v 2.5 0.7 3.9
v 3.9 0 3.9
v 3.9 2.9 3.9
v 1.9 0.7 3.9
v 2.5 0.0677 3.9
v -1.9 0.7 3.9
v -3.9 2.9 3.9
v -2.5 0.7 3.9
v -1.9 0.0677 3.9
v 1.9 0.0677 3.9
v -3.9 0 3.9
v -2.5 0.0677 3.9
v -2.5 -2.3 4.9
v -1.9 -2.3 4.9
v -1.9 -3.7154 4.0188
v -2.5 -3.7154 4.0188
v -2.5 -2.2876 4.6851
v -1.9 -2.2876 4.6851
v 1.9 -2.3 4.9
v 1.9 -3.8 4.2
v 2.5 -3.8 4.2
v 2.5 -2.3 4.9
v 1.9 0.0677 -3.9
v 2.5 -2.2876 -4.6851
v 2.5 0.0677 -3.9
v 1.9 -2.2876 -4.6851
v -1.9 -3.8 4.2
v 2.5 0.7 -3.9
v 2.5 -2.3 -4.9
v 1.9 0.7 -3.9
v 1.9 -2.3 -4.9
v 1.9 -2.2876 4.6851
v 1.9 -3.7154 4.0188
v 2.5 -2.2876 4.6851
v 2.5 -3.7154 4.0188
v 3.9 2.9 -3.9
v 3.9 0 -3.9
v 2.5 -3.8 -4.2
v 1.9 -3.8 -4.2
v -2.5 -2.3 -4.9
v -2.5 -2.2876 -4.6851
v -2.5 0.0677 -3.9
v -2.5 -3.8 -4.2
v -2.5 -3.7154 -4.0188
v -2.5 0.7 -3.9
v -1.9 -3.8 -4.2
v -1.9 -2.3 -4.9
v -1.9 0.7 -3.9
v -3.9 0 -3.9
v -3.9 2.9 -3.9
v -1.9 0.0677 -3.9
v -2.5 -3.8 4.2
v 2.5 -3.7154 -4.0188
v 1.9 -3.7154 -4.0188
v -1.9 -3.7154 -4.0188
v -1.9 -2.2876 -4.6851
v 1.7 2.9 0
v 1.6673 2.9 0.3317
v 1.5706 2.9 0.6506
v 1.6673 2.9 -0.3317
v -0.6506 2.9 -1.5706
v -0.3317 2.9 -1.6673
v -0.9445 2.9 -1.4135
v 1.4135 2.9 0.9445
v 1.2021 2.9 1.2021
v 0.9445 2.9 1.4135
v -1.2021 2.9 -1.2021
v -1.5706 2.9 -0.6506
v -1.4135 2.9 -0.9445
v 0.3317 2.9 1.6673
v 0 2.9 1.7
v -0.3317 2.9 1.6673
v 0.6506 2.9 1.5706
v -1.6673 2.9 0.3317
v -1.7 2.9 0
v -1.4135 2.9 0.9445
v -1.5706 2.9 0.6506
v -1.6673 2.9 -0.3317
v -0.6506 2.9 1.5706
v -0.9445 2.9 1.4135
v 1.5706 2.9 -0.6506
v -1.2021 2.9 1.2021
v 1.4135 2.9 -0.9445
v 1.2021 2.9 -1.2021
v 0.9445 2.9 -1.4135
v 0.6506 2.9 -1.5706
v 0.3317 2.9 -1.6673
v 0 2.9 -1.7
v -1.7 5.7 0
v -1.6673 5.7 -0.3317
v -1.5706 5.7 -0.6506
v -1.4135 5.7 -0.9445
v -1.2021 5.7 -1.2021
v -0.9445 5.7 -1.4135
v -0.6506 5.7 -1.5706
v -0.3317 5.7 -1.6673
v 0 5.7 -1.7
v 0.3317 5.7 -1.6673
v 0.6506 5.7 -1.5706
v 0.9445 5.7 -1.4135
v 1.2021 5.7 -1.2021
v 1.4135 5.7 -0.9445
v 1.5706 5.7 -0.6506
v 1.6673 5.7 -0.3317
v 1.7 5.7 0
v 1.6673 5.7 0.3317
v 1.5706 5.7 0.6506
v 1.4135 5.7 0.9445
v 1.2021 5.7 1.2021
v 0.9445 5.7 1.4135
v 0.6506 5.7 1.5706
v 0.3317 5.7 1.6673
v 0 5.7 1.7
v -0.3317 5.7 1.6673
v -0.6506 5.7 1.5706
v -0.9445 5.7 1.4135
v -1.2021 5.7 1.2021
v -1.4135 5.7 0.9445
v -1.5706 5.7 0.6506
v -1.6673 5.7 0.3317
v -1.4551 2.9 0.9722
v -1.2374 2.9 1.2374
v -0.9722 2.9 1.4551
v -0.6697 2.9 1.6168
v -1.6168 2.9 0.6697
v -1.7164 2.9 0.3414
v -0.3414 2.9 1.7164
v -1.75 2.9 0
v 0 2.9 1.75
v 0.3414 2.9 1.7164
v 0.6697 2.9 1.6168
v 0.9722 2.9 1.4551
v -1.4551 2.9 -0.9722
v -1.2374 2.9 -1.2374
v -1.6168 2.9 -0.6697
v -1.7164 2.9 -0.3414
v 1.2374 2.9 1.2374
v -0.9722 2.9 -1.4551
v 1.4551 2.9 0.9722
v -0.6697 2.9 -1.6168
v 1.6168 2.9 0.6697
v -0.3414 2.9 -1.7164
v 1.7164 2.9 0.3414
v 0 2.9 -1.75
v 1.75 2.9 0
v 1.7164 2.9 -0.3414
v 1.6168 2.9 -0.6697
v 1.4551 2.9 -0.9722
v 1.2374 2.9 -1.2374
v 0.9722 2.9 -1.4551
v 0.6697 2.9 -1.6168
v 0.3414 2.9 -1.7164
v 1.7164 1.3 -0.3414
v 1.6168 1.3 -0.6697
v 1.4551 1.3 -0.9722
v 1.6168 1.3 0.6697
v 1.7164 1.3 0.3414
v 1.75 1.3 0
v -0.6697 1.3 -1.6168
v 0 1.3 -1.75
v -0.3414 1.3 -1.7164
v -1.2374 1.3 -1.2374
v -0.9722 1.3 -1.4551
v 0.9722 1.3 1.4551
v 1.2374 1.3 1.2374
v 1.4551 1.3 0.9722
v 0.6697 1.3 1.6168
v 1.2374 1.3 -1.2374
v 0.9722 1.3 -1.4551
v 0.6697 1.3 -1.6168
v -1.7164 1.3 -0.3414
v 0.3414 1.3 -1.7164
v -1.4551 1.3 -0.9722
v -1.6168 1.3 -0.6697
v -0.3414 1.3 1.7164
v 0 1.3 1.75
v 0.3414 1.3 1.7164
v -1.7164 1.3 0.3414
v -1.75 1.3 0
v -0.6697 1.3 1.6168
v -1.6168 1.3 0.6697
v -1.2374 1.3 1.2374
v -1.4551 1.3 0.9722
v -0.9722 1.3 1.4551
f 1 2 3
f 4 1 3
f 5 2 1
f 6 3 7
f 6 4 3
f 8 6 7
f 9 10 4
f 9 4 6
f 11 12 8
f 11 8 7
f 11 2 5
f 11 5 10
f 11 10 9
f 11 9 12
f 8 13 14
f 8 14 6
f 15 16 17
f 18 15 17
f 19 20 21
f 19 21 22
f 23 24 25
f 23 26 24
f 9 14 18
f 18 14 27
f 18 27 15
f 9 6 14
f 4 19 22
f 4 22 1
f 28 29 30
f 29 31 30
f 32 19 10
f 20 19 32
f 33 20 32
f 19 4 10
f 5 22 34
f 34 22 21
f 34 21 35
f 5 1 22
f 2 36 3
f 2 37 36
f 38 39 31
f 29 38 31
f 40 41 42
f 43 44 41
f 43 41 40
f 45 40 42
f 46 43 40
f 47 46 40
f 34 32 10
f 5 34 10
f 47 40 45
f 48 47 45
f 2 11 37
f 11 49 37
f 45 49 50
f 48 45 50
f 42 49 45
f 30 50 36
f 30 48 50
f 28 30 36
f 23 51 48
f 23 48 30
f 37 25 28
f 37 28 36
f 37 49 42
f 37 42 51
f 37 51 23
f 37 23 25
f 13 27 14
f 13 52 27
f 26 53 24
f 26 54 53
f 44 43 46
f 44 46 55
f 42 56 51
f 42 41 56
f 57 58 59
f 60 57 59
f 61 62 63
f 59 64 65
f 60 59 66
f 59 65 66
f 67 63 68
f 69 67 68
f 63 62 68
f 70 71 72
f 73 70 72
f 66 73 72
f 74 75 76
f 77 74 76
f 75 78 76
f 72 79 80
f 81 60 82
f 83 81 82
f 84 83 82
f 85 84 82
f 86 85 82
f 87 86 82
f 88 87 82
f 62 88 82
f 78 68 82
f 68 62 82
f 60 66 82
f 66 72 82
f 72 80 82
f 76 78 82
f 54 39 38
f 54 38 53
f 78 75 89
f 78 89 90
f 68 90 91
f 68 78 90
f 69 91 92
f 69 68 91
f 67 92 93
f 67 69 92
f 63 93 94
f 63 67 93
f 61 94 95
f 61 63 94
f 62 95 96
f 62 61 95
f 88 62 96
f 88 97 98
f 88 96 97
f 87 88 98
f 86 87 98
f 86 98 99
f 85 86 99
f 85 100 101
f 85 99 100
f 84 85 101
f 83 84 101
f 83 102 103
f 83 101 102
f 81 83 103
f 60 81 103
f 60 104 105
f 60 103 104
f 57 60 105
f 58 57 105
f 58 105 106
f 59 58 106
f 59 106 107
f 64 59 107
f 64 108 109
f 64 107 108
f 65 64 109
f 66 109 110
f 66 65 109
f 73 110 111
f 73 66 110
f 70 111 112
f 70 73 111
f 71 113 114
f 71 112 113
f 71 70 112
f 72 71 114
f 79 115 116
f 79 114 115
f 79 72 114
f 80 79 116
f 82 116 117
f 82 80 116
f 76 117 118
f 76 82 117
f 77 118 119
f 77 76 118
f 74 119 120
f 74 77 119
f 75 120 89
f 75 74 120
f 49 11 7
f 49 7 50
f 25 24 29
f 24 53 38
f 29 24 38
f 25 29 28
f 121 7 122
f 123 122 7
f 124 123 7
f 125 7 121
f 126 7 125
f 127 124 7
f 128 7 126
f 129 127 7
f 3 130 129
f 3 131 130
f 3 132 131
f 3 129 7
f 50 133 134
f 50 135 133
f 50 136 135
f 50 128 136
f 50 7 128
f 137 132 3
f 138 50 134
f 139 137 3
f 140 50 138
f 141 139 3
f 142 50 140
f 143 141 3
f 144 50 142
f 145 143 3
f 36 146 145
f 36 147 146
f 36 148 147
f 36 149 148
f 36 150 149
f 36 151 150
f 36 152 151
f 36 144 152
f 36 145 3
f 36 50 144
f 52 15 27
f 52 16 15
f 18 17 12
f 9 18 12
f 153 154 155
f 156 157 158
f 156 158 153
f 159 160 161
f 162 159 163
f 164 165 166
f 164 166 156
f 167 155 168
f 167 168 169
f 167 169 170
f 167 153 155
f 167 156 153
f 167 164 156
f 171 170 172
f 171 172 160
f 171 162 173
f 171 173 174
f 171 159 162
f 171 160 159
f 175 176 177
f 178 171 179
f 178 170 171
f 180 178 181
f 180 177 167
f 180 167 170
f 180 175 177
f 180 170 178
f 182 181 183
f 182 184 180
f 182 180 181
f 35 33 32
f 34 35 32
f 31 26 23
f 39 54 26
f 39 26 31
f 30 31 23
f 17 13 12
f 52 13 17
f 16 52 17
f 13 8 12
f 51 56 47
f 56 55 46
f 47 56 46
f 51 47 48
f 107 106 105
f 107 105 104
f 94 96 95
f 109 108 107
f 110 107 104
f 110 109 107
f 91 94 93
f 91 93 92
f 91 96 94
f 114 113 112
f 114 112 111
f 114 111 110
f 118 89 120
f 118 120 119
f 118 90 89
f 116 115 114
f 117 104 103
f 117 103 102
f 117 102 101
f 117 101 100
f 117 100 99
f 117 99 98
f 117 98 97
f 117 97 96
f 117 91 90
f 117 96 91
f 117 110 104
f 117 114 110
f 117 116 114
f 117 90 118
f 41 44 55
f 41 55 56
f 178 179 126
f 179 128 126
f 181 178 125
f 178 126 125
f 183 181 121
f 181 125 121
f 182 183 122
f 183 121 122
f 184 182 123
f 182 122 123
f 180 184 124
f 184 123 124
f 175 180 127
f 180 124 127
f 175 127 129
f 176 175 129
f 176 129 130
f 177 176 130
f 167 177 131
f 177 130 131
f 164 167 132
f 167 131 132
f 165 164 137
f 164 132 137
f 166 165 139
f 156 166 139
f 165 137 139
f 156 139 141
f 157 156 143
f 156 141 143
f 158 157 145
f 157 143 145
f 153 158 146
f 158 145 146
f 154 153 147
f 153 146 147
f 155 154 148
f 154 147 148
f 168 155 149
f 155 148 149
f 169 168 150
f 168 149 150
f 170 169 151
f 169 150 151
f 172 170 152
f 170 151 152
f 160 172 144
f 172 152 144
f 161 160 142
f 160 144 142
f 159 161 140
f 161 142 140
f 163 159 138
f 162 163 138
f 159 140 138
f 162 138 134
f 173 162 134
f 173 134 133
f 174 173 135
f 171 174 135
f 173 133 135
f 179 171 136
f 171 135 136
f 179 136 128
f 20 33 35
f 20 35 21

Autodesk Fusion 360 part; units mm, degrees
sketch "Sketch1" plane through (0, 0, 0) normal (0, 1, 0) x (1, 0, 0) in component "Base"
  line L0 (3.9, -3.9) -> (-3.9, -3.9)
  line L1 (-3.9, -3.9) -> (-3.9, 3.9)
  line L2 (-3.9, 3.9) -> (3.9, 3.9)
  line L3 (3.9, 3.9) -> (3.9, -3.9)
  line L4 (3.9, -3.9) -> (-3.9, 3.9) construction
  line L5 (-3.9, -3.9) -> (3.9, 3.9) construction
  dimension "d1" = 7.8
  dimension "d2" = 7.8
extrude "Extrude1" add sketch "Sketch1" along normal blind 2.9 makes body 1 in component "Base"
ref_plane "WorkPlane1" through (-3.9, 1.45, 0) normal (-1, 0, 0) x (0, 0, 1) in component "Base"
sketch "Sketch2" plane through (-3.9, 1.45, 0) normal (-1, 0, 0) x (0, 0, -1) in component "Base"
  line L0 (-3.9, 1.45) -> (3.9, 1.45) construction
  line L1 (-3.9, 1.45) -> (-4.9, 1.45) construction
  line L2 (-4.9, 1.45) -> (-4.9, 5.25) construction
  line L3 (3.9, 1.45) -> (4.9, 1.45) construction
  line L4 (4.9, 1.45) -> (4.9, 5.25) construction
  line L5 (-4.9, 5.25) -> (-4.2, 5.25) construction
  line L6 (4.9, 5.25) -> (4.2, 5.25) construction
  line L7 (4.9, 5.25) -> (4.9, 3.75) construction
  line L8 (-4.9, 5.25) -> (-4.9, 3.75) construction
  line L9 (-3.9, 1.45) -> (-3.9, 0.75) construction
  line L10 (3.9, 1.45) -> (3.9, -1.45) construction
  line L11 (-3.9, 0.75) -> (3.9, 0.75) construction
  line L12 (4.2, 5.25) -> (4.9, 3.75)
  line L13 (4.9, 3.75) -> (3.9, 0.75)
  line L14 (-4.2, 5.25) -> (-4.9, 3.75)
  line L15 (-4.9, 3.75) -> (-3.9, 0.75)
  line L16 (-4.0188, 5.1654) -> (-4.6851, 3.7376)
  line L17 (-4.6851, 3.7376) -> (-3.7103, 0.8132)
  line L18 (4.0188, 5.1654) -> (4.6851, 3.7376)
  line L19 (4.6851, 3.7376) -> (3.7103, 0.8132)
  line L20 (4.2, 5.25) -> (4.0188, 5.1654)
  line L21 (-4.0188, 5.1654) -> (-4.2, 5.25)
  line L22 (-3.9, 0.75) -> (-3.7103, 0.8132)
  line L23 (3.9, 0.75) -> (3.7103, 0.8132)
  point P0 (-3.9, 1.45)
  dimension "d6" = 1
  dimension "d7" = 3.8
  dimension "d8" = 1
  dimension "d9" = 3.8
  dimension "d10" = 0.7
  dimension "d11" = 0.7
  dimension "d12" = 1.5
  dimension "d13" = 1.5
  dimension "d14" = 0.7
  dimension "d15" = -0.2
  dimension "d16" = 0.2
extrude "Extrude2" add sketch "Sketch2" along normal blind -6.4 and the other way blind 5.8 separate body makes body 2 at (2.1, -1.3, -4.5667) makes body 3 at (2.1, -1.3, 4.5667) in component "Base"
extrude "Extrude3" add sketch "Sketch2" along normal blind -2 and the other way blind 1.4 separate body makes body 4 at (-2.3, -1.3, 4.5667) makes body 5 at (-2.3, -1.3, -4.5667) in component "Base"
combine "Combine1" operation add target body 1 tool bodies 4 3 2 5 in component "Base"
sketch "Sketch1 (2)" plane through (0, 2.9, 0) normal (0, 1, 0) x (-1, 0, 0) in component "Button"
  line L0 (-3.9, -3.9) -> (3.9, -3.9)
  line L1 (3.9, -3.9) -> (3.9, 3.9)
  line L2 (3.9, 3.9) -> (-3.9, 3.9)
  line L3 (-3.9, 3.9) -> (-3.9, -3.9)
  circle A0 centre (0, 0) radius 1.7
  dimension "d25" = 3.4
extrude "Extrude1'" add sketch "Sketch1 (2)" along normal blind 2.8 separate body contours A0 makes body 6 in component "Button"
sketch "Sketch3" plane through (0, 2.9, 0) normal (0, 1, 0) x (-1, 0, 0) in component "Base"
  line L0 (-3.9, -3.9) -> (3.9, -3.9)
  line L1 (3.9, -3.9) -> (3.9, 3.9)
  line L2 (3.9, 3.9) -> (-3.9, 3.9)
  line L3 (-3.9, 3.9) -> (-3.9, -3.9)
  circle A0 centre (0, 0) radius 1.75
  dimension "d28" = 3.5
extrude "Extrude4" cut sketch "Sketch3" against normal blind 1.6 contours A0 bodies 1 in component "Base"
component "Base" placed x (1, 0, 0) y (0, 1, 0) z (0, 0, 1) at (0, 0, 0)
component "Button" placed x (1, 0, 0) y (0, 1, 0) z (0, 0, 1) at (0, 0, 0)
equation "d17 = -7.80 mm + 1.4 mm"
equation "d19 = 6.4 mm - 0.6 mm"
